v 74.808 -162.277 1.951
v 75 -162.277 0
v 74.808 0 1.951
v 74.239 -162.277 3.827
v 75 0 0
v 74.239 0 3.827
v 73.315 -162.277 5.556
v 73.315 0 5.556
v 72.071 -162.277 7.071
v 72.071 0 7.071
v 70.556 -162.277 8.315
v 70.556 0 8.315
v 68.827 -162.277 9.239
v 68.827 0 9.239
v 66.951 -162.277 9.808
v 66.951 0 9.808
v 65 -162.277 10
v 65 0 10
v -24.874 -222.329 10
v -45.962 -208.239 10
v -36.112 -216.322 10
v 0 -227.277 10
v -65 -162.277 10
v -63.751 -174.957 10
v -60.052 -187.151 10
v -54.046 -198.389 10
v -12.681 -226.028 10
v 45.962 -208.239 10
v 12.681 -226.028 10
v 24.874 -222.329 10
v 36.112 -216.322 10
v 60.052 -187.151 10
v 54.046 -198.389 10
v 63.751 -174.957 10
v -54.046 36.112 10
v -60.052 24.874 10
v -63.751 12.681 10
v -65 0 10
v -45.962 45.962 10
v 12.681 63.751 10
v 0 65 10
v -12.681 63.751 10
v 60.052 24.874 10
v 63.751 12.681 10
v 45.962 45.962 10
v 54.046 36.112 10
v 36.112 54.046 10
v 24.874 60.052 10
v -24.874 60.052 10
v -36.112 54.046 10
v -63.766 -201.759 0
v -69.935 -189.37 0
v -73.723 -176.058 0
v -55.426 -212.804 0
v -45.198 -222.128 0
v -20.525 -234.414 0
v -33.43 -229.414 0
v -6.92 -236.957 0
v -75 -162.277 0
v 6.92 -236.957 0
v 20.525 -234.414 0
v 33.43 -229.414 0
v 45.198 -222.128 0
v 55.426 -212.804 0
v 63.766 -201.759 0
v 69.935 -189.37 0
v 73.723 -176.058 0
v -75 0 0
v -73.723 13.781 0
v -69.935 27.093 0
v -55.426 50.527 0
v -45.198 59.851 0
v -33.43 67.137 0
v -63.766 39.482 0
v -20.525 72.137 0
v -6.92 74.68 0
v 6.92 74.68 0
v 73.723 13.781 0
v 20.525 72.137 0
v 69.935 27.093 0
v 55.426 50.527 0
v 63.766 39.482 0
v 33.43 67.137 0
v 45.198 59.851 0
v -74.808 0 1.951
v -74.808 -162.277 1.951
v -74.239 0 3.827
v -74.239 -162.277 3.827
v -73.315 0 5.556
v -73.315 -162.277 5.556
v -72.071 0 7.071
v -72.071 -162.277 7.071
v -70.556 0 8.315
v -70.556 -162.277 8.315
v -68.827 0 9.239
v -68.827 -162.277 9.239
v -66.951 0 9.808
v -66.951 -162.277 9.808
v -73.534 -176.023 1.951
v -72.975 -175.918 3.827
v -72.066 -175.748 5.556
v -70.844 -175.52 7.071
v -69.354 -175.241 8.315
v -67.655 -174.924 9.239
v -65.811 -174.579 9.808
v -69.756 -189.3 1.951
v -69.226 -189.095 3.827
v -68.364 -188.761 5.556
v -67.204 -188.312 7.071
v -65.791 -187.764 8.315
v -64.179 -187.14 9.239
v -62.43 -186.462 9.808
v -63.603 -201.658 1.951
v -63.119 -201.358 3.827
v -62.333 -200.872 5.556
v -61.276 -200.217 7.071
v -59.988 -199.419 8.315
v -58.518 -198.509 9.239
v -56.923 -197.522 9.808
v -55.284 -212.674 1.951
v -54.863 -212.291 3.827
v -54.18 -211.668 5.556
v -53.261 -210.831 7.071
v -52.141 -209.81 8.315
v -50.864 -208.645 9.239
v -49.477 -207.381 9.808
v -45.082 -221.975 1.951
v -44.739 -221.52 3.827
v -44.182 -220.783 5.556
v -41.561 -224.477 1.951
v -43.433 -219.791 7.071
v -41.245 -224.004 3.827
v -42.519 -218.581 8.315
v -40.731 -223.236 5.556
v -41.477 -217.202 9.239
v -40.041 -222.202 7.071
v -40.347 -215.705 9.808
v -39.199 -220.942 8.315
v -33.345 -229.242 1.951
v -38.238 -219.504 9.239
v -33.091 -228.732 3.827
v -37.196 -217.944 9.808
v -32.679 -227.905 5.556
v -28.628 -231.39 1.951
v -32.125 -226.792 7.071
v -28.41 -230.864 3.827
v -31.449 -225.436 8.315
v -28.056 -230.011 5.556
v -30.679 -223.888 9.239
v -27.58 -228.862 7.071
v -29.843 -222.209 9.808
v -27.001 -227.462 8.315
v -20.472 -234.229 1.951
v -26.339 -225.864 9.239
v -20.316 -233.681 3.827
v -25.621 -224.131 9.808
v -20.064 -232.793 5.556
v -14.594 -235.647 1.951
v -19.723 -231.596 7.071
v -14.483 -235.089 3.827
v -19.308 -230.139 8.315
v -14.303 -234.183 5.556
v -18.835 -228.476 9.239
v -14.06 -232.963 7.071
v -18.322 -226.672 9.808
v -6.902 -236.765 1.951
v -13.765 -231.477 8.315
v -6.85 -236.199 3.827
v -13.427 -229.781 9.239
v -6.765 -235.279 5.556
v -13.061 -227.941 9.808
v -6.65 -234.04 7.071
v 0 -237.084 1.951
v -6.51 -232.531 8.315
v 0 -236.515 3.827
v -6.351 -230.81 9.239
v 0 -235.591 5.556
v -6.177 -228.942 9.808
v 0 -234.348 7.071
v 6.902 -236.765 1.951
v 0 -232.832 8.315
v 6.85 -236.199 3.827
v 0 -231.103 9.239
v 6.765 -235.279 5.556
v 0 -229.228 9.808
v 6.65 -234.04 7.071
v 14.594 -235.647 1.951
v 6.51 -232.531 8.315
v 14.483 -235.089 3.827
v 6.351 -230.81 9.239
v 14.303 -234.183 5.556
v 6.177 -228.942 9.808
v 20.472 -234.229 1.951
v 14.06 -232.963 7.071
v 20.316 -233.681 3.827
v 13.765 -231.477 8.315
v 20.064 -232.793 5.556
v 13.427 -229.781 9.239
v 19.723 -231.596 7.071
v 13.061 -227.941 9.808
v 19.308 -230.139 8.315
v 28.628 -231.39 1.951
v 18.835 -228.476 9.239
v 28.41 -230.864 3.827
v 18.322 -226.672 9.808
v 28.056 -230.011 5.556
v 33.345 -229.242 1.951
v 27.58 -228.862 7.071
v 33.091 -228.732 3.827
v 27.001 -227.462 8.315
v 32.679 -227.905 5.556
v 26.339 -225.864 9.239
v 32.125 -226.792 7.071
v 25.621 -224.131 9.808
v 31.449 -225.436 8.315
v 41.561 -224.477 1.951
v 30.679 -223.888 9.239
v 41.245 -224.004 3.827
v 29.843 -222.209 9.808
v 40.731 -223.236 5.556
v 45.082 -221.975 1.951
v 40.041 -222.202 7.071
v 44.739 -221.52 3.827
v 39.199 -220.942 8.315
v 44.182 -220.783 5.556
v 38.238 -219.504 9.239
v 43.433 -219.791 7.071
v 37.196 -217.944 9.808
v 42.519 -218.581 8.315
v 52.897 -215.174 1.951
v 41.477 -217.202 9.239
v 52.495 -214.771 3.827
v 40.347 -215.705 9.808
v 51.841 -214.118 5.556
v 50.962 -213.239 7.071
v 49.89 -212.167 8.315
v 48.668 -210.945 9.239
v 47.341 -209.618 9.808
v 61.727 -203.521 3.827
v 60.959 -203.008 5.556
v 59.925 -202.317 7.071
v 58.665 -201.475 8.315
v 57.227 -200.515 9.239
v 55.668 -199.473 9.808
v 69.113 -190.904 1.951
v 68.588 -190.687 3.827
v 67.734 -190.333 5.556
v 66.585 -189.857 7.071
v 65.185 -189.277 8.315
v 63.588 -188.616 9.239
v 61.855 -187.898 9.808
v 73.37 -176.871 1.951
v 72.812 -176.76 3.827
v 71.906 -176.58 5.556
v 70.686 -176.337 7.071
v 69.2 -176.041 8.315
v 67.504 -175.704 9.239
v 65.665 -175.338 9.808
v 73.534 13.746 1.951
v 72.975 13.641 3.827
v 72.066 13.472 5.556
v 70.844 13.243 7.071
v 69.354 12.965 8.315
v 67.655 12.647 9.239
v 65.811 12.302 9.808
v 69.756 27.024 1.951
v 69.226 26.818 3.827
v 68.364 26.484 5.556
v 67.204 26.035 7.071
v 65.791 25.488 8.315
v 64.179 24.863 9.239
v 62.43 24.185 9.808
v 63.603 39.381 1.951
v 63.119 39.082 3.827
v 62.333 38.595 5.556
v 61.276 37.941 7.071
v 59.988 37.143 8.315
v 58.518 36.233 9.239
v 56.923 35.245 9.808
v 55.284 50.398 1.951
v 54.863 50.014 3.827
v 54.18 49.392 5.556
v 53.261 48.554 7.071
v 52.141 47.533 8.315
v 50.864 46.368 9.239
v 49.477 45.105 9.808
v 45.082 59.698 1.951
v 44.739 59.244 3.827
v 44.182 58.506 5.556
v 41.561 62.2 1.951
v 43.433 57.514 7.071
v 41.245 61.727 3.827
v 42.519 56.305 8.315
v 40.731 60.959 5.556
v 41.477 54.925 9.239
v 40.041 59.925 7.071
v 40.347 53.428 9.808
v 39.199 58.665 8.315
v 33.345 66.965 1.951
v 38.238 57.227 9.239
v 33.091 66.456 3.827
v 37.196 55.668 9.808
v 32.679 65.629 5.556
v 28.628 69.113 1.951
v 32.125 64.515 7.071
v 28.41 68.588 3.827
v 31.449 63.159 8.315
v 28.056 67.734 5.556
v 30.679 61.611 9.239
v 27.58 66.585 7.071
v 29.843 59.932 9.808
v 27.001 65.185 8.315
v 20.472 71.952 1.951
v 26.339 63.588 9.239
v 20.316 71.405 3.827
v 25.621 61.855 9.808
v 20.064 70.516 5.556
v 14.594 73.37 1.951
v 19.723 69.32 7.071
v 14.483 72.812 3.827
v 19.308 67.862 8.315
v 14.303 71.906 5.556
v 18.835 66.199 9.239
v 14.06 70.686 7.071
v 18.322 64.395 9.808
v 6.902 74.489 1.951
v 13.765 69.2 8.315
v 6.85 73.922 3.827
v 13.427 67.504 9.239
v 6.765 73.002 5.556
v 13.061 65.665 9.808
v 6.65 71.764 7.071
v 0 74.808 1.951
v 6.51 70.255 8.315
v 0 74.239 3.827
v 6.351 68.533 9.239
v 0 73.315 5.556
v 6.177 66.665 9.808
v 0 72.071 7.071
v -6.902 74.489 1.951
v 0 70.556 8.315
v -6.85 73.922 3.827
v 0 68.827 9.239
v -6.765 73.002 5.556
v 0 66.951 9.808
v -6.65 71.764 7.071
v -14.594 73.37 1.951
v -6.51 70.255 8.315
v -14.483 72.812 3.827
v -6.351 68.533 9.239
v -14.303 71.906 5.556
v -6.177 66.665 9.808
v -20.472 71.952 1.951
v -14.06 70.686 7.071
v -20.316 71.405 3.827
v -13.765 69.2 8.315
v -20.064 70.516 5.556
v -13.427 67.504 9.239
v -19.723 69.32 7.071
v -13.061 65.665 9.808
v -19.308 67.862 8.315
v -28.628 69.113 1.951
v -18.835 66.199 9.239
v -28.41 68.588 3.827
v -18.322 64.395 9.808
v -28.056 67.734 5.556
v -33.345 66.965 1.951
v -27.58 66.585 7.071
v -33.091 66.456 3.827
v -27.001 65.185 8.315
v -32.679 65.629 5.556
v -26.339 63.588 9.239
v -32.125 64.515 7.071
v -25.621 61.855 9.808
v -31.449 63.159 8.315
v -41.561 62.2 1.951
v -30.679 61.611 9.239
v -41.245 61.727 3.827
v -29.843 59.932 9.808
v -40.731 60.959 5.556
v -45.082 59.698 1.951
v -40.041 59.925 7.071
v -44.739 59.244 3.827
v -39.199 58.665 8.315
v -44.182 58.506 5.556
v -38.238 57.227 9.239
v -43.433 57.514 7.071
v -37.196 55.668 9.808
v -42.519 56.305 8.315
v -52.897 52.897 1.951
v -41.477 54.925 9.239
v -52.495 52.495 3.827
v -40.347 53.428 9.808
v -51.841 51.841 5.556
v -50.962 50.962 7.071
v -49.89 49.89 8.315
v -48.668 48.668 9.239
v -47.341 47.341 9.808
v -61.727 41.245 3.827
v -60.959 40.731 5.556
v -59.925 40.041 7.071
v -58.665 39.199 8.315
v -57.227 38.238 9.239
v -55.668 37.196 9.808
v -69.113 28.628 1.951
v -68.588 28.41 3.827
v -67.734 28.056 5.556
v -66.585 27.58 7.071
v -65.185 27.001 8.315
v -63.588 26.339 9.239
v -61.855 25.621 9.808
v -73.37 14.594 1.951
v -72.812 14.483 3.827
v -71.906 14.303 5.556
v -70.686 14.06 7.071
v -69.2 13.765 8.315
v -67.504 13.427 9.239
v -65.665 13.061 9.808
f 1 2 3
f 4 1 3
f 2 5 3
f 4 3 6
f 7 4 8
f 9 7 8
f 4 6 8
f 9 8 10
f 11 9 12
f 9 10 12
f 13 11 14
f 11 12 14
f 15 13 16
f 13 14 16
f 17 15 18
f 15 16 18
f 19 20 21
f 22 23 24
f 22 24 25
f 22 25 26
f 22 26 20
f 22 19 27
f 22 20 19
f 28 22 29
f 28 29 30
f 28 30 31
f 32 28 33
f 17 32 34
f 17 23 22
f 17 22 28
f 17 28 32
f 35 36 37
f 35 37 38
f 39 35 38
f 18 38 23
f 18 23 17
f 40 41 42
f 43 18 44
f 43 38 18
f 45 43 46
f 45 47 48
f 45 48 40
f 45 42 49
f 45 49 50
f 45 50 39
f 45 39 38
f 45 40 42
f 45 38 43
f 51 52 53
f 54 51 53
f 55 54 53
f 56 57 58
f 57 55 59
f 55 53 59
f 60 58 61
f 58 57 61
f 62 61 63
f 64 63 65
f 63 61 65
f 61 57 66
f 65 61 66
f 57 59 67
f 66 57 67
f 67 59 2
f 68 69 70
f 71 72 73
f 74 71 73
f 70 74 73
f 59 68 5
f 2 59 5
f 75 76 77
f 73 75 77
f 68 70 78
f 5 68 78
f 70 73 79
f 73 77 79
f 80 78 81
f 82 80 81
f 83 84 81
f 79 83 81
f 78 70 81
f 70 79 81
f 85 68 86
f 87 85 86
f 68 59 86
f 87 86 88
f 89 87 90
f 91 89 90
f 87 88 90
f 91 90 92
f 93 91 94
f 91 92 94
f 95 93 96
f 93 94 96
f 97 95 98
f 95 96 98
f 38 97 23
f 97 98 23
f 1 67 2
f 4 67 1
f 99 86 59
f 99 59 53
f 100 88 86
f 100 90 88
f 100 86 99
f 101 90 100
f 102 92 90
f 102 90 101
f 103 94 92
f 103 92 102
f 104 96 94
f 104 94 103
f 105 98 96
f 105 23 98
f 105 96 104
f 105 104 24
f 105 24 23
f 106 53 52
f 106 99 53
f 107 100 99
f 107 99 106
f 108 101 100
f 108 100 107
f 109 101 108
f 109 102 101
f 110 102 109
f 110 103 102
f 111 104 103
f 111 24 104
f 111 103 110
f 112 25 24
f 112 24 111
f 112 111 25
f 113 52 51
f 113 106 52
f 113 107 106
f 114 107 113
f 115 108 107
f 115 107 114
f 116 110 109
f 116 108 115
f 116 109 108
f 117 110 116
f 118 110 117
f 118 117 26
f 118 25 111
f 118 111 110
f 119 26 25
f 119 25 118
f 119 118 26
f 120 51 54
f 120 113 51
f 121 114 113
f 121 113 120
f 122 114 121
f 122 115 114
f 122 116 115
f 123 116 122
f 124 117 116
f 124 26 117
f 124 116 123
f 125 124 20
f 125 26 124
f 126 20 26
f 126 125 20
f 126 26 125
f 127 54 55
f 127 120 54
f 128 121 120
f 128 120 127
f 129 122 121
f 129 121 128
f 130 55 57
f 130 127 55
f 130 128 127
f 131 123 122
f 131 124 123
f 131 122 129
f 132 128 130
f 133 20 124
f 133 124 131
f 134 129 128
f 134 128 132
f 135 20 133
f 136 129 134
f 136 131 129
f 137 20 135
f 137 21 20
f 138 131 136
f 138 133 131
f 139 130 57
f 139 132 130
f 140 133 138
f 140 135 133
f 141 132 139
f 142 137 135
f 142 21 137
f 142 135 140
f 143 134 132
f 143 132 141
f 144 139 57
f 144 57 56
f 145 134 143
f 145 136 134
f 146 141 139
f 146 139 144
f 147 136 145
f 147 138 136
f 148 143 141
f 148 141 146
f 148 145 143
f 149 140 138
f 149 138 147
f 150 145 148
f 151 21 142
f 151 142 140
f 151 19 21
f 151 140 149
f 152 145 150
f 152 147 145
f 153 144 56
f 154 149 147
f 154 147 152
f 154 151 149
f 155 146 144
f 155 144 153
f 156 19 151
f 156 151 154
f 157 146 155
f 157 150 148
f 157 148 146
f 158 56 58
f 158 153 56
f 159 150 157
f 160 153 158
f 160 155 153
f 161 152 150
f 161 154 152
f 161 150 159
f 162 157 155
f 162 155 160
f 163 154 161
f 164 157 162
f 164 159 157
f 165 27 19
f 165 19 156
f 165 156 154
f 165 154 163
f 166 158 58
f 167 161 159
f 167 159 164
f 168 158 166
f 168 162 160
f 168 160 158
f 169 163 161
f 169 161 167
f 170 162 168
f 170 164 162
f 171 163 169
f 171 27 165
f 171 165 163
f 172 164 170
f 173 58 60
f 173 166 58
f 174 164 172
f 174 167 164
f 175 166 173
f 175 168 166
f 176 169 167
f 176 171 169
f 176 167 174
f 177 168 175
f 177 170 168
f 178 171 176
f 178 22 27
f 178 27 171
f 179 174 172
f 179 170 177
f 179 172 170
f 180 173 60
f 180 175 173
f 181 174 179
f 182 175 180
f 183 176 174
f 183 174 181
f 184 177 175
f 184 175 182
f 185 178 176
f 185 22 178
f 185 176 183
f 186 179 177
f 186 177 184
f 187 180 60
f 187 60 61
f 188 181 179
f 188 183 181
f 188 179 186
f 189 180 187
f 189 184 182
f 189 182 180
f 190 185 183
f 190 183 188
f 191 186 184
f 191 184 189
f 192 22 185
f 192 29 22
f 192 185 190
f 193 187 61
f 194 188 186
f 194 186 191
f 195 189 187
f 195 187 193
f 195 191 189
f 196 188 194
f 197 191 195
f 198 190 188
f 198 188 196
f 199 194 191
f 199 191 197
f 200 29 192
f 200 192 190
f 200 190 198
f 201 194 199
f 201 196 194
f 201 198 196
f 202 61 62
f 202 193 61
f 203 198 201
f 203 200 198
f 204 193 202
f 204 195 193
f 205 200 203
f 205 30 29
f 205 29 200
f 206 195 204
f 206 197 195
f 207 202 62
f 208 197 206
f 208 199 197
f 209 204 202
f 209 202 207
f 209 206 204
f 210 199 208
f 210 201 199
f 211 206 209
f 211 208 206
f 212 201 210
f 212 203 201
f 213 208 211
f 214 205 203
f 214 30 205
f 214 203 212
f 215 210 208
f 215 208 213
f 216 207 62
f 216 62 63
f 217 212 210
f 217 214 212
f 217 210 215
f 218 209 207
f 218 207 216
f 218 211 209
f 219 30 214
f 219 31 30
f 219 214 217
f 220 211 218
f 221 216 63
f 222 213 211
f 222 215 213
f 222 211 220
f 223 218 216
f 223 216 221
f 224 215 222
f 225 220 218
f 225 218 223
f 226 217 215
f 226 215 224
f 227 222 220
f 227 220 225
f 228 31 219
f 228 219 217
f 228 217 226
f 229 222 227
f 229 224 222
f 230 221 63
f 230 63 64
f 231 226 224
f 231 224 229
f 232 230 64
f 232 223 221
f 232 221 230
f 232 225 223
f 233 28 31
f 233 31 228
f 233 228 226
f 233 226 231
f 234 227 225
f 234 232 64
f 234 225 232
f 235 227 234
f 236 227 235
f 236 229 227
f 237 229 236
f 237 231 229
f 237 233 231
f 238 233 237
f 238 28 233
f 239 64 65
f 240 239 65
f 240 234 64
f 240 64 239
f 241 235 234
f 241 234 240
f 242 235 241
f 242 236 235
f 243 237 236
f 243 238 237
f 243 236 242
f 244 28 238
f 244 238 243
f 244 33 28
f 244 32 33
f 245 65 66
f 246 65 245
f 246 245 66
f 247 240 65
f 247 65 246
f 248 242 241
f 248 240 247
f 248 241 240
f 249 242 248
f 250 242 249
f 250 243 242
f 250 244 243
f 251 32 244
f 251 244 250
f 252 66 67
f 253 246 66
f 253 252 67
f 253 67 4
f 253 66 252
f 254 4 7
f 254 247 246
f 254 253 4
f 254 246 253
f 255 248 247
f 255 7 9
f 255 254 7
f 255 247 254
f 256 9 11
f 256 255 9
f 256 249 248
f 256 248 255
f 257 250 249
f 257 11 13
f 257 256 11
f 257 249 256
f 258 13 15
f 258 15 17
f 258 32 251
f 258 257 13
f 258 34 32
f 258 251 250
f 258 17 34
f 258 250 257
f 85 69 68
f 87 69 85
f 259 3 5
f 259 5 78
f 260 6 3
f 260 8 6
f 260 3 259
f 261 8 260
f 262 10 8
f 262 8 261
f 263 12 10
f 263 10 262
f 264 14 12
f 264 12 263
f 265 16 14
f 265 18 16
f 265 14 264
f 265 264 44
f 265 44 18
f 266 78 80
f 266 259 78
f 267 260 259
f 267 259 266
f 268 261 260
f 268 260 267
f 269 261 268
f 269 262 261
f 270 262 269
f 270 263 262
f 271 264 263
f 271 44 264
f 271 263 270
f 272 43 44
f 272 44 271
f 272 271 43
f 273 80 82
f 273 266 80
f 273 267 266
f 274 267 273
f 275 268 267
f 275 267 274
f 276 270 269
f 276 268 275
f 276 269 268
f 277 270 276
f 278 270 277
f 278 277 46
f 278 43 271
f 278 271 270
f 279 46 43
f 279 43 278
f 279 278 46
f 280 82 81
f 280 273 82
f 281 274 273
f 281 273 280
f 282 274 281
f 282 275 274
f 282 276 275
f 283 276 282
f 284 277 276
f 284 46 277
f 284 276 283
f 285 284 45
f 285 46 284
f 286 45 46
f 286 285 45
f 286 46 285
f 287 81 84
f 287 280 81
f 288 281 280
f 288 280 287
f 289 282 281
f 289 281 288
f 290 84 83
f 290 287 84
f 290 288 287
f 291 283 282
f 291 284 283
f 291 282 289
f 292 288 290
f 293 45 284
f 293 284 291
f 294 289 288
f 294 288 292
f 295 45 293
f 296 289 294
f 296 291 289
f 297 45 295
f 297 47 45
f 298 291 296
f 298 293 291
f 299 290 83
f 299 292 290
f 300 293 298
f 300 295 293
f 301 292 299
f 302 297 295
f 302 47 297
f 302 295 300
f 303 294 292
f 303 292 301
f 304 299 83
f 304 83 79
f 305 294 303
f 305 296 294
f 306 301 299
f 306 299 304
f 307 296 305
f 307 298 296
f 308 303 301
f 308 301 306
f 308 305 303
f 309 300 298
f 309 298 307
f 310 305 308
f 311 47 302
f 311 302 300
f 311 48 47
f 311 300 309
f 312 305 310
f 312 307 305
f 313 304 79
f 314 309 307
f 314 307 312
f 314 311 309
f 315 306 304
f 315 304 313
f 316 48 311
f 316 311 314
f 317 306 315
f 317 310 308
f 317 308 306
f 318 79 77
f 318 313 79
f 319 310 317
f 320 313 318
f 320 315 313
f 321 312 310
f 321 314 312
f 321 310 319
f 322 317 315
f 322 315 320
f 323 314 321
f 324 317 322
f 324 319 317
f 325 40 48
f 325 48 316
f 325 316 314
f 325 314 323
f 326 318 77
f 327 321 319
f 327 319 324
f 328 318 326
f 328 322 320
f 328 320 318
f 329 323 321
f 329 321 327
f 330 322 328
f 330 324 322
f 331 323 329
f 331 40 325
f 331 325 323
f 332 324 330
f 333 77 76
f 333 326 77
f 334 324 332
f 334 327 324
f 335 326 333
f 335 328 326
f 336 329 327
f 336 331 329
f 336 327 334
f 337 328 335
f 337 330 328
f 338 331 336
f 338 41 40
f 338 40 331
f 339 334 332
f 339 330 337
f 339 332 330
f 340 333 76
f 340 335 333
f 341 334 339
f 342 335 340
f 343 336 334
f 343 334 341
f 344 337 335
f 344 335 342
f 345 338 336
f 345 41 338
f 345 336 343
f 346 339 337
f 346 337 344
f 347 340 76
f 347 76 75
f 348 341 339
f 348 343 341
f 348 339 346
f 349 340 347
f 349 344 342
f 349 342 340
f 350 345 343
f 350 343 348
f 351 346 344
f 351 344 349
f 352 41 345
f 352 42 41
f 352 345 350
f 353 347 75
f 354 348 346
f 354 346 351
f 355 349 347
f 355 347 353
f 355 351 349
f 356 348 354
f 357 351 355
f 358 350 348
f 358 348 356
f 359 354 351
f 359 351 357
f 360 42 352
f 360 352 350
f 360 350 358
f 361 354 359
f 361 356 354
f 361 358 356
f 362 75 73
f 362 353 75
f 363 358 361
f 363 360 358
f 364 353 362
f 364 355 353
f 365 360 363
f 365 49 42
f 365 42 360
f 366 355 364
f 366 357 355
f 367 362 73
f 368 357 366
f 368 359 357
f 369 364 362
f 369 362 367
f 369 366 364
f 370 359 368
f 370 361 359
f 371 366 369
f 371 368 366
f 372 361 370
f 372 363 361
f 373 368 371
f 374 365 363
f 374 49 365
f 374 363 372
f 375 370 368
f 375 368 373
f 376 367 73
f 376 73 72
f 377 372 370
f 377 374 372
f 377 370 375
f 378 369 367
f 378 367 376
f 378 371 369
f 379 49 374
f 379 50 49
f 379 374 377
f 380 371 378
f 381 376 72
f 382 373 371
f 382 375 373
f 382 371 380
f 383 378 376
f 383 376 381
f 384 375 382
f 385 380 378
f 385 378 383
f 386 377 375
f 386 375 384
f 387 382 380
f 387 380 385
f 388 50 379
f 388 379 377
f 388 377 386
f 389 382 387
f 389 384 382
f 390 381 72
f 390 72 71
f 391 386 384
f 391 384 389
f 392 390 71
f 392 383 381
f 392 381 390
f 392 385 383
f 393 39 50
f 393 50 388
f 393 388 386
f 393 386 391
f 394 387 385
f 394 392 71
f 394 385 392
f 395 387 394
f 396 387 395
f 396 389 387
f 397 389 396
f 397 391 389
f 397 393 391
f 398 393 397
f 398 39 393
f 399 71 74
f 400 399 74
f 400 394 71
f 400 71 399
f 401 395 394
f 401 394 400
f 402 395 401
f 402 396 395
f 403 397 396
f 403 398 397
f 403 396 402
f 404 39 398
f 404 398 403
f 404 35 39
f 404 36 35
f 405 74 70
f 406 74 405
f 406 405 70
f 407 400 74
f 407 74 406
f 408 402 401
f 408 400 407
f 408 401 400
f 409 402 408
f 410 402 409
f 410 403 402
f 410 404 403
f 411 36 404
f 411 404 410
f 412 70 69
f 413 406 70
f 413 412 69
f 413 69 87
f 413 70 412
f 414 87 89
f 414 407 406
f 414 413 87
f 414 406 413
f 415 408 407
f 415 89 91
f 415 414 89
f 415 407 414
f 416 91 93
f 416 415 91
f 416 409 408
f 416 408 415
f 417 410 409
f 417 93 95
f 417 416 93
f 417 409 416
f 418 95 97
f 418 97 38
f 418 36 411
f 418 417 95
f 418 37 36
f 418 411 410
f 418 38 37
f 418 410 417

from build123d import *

# Parameters (mm, degrees)
BOSS_EXTRU_1_DEPTH = 10
CONG_1_R           = 10


with BuildPart() as part:
    # Esquisse1 → Boss.-Extru.1 (new body)
    with BuildSketch(Plane.XY):
        with BuildLine():
            ThreePointArc((75, 0), (0, -75), (-75, 0))
            Line((-75, 0), (-75, -162.276597369))
            ThreePointArc((-75, -162.276597369), (0, -87.276597369), (75, -162.276597369))
            Line((75, -162.276597369), (75, 0))
        make_face()
        with BuildLine():
            ThreePointArc((75, 0), (0, 75), (-75, 0))
            Line((-75, 0), (75, 0))
        make_face()
        with BuildLine():
            Line((75, 0), (-75, 0))
            ThreePointArc((-75, 0), (0, -75), (75, 0))
        make_face()
        with BuildLine():
            ThreePointArc((75, -162.276597369), (0, -87.276597369), (-75, -162.276597369))
            Line((-75, -162.276597369), (75, -162.276597369))
        make_face()
        with BuildLine():
            Line((75, -162.276597369), (-75, -162.276597369))
            ThreePointArc((-75, -162.276597369), (0, -237.276597369), (75, -162.276597369))
        make_face()
    extrude(amount=BOSS_EXTRU_1_DEPTH)

    # Congé1
    cong_1_edges = [part.edges().sort_by_distance(p)[0] for p in [
        (0, 75, 10),
        (75, -81.138298684, 10),
        (0, -237.276597369, 10),
        (-75, -81.138298684, 10),
    ]]
    fillet(cong_1_edges, radius=CONG_1_R - 0.0001)  # a hair under: the kernel refuses the full size


solid = part.part
